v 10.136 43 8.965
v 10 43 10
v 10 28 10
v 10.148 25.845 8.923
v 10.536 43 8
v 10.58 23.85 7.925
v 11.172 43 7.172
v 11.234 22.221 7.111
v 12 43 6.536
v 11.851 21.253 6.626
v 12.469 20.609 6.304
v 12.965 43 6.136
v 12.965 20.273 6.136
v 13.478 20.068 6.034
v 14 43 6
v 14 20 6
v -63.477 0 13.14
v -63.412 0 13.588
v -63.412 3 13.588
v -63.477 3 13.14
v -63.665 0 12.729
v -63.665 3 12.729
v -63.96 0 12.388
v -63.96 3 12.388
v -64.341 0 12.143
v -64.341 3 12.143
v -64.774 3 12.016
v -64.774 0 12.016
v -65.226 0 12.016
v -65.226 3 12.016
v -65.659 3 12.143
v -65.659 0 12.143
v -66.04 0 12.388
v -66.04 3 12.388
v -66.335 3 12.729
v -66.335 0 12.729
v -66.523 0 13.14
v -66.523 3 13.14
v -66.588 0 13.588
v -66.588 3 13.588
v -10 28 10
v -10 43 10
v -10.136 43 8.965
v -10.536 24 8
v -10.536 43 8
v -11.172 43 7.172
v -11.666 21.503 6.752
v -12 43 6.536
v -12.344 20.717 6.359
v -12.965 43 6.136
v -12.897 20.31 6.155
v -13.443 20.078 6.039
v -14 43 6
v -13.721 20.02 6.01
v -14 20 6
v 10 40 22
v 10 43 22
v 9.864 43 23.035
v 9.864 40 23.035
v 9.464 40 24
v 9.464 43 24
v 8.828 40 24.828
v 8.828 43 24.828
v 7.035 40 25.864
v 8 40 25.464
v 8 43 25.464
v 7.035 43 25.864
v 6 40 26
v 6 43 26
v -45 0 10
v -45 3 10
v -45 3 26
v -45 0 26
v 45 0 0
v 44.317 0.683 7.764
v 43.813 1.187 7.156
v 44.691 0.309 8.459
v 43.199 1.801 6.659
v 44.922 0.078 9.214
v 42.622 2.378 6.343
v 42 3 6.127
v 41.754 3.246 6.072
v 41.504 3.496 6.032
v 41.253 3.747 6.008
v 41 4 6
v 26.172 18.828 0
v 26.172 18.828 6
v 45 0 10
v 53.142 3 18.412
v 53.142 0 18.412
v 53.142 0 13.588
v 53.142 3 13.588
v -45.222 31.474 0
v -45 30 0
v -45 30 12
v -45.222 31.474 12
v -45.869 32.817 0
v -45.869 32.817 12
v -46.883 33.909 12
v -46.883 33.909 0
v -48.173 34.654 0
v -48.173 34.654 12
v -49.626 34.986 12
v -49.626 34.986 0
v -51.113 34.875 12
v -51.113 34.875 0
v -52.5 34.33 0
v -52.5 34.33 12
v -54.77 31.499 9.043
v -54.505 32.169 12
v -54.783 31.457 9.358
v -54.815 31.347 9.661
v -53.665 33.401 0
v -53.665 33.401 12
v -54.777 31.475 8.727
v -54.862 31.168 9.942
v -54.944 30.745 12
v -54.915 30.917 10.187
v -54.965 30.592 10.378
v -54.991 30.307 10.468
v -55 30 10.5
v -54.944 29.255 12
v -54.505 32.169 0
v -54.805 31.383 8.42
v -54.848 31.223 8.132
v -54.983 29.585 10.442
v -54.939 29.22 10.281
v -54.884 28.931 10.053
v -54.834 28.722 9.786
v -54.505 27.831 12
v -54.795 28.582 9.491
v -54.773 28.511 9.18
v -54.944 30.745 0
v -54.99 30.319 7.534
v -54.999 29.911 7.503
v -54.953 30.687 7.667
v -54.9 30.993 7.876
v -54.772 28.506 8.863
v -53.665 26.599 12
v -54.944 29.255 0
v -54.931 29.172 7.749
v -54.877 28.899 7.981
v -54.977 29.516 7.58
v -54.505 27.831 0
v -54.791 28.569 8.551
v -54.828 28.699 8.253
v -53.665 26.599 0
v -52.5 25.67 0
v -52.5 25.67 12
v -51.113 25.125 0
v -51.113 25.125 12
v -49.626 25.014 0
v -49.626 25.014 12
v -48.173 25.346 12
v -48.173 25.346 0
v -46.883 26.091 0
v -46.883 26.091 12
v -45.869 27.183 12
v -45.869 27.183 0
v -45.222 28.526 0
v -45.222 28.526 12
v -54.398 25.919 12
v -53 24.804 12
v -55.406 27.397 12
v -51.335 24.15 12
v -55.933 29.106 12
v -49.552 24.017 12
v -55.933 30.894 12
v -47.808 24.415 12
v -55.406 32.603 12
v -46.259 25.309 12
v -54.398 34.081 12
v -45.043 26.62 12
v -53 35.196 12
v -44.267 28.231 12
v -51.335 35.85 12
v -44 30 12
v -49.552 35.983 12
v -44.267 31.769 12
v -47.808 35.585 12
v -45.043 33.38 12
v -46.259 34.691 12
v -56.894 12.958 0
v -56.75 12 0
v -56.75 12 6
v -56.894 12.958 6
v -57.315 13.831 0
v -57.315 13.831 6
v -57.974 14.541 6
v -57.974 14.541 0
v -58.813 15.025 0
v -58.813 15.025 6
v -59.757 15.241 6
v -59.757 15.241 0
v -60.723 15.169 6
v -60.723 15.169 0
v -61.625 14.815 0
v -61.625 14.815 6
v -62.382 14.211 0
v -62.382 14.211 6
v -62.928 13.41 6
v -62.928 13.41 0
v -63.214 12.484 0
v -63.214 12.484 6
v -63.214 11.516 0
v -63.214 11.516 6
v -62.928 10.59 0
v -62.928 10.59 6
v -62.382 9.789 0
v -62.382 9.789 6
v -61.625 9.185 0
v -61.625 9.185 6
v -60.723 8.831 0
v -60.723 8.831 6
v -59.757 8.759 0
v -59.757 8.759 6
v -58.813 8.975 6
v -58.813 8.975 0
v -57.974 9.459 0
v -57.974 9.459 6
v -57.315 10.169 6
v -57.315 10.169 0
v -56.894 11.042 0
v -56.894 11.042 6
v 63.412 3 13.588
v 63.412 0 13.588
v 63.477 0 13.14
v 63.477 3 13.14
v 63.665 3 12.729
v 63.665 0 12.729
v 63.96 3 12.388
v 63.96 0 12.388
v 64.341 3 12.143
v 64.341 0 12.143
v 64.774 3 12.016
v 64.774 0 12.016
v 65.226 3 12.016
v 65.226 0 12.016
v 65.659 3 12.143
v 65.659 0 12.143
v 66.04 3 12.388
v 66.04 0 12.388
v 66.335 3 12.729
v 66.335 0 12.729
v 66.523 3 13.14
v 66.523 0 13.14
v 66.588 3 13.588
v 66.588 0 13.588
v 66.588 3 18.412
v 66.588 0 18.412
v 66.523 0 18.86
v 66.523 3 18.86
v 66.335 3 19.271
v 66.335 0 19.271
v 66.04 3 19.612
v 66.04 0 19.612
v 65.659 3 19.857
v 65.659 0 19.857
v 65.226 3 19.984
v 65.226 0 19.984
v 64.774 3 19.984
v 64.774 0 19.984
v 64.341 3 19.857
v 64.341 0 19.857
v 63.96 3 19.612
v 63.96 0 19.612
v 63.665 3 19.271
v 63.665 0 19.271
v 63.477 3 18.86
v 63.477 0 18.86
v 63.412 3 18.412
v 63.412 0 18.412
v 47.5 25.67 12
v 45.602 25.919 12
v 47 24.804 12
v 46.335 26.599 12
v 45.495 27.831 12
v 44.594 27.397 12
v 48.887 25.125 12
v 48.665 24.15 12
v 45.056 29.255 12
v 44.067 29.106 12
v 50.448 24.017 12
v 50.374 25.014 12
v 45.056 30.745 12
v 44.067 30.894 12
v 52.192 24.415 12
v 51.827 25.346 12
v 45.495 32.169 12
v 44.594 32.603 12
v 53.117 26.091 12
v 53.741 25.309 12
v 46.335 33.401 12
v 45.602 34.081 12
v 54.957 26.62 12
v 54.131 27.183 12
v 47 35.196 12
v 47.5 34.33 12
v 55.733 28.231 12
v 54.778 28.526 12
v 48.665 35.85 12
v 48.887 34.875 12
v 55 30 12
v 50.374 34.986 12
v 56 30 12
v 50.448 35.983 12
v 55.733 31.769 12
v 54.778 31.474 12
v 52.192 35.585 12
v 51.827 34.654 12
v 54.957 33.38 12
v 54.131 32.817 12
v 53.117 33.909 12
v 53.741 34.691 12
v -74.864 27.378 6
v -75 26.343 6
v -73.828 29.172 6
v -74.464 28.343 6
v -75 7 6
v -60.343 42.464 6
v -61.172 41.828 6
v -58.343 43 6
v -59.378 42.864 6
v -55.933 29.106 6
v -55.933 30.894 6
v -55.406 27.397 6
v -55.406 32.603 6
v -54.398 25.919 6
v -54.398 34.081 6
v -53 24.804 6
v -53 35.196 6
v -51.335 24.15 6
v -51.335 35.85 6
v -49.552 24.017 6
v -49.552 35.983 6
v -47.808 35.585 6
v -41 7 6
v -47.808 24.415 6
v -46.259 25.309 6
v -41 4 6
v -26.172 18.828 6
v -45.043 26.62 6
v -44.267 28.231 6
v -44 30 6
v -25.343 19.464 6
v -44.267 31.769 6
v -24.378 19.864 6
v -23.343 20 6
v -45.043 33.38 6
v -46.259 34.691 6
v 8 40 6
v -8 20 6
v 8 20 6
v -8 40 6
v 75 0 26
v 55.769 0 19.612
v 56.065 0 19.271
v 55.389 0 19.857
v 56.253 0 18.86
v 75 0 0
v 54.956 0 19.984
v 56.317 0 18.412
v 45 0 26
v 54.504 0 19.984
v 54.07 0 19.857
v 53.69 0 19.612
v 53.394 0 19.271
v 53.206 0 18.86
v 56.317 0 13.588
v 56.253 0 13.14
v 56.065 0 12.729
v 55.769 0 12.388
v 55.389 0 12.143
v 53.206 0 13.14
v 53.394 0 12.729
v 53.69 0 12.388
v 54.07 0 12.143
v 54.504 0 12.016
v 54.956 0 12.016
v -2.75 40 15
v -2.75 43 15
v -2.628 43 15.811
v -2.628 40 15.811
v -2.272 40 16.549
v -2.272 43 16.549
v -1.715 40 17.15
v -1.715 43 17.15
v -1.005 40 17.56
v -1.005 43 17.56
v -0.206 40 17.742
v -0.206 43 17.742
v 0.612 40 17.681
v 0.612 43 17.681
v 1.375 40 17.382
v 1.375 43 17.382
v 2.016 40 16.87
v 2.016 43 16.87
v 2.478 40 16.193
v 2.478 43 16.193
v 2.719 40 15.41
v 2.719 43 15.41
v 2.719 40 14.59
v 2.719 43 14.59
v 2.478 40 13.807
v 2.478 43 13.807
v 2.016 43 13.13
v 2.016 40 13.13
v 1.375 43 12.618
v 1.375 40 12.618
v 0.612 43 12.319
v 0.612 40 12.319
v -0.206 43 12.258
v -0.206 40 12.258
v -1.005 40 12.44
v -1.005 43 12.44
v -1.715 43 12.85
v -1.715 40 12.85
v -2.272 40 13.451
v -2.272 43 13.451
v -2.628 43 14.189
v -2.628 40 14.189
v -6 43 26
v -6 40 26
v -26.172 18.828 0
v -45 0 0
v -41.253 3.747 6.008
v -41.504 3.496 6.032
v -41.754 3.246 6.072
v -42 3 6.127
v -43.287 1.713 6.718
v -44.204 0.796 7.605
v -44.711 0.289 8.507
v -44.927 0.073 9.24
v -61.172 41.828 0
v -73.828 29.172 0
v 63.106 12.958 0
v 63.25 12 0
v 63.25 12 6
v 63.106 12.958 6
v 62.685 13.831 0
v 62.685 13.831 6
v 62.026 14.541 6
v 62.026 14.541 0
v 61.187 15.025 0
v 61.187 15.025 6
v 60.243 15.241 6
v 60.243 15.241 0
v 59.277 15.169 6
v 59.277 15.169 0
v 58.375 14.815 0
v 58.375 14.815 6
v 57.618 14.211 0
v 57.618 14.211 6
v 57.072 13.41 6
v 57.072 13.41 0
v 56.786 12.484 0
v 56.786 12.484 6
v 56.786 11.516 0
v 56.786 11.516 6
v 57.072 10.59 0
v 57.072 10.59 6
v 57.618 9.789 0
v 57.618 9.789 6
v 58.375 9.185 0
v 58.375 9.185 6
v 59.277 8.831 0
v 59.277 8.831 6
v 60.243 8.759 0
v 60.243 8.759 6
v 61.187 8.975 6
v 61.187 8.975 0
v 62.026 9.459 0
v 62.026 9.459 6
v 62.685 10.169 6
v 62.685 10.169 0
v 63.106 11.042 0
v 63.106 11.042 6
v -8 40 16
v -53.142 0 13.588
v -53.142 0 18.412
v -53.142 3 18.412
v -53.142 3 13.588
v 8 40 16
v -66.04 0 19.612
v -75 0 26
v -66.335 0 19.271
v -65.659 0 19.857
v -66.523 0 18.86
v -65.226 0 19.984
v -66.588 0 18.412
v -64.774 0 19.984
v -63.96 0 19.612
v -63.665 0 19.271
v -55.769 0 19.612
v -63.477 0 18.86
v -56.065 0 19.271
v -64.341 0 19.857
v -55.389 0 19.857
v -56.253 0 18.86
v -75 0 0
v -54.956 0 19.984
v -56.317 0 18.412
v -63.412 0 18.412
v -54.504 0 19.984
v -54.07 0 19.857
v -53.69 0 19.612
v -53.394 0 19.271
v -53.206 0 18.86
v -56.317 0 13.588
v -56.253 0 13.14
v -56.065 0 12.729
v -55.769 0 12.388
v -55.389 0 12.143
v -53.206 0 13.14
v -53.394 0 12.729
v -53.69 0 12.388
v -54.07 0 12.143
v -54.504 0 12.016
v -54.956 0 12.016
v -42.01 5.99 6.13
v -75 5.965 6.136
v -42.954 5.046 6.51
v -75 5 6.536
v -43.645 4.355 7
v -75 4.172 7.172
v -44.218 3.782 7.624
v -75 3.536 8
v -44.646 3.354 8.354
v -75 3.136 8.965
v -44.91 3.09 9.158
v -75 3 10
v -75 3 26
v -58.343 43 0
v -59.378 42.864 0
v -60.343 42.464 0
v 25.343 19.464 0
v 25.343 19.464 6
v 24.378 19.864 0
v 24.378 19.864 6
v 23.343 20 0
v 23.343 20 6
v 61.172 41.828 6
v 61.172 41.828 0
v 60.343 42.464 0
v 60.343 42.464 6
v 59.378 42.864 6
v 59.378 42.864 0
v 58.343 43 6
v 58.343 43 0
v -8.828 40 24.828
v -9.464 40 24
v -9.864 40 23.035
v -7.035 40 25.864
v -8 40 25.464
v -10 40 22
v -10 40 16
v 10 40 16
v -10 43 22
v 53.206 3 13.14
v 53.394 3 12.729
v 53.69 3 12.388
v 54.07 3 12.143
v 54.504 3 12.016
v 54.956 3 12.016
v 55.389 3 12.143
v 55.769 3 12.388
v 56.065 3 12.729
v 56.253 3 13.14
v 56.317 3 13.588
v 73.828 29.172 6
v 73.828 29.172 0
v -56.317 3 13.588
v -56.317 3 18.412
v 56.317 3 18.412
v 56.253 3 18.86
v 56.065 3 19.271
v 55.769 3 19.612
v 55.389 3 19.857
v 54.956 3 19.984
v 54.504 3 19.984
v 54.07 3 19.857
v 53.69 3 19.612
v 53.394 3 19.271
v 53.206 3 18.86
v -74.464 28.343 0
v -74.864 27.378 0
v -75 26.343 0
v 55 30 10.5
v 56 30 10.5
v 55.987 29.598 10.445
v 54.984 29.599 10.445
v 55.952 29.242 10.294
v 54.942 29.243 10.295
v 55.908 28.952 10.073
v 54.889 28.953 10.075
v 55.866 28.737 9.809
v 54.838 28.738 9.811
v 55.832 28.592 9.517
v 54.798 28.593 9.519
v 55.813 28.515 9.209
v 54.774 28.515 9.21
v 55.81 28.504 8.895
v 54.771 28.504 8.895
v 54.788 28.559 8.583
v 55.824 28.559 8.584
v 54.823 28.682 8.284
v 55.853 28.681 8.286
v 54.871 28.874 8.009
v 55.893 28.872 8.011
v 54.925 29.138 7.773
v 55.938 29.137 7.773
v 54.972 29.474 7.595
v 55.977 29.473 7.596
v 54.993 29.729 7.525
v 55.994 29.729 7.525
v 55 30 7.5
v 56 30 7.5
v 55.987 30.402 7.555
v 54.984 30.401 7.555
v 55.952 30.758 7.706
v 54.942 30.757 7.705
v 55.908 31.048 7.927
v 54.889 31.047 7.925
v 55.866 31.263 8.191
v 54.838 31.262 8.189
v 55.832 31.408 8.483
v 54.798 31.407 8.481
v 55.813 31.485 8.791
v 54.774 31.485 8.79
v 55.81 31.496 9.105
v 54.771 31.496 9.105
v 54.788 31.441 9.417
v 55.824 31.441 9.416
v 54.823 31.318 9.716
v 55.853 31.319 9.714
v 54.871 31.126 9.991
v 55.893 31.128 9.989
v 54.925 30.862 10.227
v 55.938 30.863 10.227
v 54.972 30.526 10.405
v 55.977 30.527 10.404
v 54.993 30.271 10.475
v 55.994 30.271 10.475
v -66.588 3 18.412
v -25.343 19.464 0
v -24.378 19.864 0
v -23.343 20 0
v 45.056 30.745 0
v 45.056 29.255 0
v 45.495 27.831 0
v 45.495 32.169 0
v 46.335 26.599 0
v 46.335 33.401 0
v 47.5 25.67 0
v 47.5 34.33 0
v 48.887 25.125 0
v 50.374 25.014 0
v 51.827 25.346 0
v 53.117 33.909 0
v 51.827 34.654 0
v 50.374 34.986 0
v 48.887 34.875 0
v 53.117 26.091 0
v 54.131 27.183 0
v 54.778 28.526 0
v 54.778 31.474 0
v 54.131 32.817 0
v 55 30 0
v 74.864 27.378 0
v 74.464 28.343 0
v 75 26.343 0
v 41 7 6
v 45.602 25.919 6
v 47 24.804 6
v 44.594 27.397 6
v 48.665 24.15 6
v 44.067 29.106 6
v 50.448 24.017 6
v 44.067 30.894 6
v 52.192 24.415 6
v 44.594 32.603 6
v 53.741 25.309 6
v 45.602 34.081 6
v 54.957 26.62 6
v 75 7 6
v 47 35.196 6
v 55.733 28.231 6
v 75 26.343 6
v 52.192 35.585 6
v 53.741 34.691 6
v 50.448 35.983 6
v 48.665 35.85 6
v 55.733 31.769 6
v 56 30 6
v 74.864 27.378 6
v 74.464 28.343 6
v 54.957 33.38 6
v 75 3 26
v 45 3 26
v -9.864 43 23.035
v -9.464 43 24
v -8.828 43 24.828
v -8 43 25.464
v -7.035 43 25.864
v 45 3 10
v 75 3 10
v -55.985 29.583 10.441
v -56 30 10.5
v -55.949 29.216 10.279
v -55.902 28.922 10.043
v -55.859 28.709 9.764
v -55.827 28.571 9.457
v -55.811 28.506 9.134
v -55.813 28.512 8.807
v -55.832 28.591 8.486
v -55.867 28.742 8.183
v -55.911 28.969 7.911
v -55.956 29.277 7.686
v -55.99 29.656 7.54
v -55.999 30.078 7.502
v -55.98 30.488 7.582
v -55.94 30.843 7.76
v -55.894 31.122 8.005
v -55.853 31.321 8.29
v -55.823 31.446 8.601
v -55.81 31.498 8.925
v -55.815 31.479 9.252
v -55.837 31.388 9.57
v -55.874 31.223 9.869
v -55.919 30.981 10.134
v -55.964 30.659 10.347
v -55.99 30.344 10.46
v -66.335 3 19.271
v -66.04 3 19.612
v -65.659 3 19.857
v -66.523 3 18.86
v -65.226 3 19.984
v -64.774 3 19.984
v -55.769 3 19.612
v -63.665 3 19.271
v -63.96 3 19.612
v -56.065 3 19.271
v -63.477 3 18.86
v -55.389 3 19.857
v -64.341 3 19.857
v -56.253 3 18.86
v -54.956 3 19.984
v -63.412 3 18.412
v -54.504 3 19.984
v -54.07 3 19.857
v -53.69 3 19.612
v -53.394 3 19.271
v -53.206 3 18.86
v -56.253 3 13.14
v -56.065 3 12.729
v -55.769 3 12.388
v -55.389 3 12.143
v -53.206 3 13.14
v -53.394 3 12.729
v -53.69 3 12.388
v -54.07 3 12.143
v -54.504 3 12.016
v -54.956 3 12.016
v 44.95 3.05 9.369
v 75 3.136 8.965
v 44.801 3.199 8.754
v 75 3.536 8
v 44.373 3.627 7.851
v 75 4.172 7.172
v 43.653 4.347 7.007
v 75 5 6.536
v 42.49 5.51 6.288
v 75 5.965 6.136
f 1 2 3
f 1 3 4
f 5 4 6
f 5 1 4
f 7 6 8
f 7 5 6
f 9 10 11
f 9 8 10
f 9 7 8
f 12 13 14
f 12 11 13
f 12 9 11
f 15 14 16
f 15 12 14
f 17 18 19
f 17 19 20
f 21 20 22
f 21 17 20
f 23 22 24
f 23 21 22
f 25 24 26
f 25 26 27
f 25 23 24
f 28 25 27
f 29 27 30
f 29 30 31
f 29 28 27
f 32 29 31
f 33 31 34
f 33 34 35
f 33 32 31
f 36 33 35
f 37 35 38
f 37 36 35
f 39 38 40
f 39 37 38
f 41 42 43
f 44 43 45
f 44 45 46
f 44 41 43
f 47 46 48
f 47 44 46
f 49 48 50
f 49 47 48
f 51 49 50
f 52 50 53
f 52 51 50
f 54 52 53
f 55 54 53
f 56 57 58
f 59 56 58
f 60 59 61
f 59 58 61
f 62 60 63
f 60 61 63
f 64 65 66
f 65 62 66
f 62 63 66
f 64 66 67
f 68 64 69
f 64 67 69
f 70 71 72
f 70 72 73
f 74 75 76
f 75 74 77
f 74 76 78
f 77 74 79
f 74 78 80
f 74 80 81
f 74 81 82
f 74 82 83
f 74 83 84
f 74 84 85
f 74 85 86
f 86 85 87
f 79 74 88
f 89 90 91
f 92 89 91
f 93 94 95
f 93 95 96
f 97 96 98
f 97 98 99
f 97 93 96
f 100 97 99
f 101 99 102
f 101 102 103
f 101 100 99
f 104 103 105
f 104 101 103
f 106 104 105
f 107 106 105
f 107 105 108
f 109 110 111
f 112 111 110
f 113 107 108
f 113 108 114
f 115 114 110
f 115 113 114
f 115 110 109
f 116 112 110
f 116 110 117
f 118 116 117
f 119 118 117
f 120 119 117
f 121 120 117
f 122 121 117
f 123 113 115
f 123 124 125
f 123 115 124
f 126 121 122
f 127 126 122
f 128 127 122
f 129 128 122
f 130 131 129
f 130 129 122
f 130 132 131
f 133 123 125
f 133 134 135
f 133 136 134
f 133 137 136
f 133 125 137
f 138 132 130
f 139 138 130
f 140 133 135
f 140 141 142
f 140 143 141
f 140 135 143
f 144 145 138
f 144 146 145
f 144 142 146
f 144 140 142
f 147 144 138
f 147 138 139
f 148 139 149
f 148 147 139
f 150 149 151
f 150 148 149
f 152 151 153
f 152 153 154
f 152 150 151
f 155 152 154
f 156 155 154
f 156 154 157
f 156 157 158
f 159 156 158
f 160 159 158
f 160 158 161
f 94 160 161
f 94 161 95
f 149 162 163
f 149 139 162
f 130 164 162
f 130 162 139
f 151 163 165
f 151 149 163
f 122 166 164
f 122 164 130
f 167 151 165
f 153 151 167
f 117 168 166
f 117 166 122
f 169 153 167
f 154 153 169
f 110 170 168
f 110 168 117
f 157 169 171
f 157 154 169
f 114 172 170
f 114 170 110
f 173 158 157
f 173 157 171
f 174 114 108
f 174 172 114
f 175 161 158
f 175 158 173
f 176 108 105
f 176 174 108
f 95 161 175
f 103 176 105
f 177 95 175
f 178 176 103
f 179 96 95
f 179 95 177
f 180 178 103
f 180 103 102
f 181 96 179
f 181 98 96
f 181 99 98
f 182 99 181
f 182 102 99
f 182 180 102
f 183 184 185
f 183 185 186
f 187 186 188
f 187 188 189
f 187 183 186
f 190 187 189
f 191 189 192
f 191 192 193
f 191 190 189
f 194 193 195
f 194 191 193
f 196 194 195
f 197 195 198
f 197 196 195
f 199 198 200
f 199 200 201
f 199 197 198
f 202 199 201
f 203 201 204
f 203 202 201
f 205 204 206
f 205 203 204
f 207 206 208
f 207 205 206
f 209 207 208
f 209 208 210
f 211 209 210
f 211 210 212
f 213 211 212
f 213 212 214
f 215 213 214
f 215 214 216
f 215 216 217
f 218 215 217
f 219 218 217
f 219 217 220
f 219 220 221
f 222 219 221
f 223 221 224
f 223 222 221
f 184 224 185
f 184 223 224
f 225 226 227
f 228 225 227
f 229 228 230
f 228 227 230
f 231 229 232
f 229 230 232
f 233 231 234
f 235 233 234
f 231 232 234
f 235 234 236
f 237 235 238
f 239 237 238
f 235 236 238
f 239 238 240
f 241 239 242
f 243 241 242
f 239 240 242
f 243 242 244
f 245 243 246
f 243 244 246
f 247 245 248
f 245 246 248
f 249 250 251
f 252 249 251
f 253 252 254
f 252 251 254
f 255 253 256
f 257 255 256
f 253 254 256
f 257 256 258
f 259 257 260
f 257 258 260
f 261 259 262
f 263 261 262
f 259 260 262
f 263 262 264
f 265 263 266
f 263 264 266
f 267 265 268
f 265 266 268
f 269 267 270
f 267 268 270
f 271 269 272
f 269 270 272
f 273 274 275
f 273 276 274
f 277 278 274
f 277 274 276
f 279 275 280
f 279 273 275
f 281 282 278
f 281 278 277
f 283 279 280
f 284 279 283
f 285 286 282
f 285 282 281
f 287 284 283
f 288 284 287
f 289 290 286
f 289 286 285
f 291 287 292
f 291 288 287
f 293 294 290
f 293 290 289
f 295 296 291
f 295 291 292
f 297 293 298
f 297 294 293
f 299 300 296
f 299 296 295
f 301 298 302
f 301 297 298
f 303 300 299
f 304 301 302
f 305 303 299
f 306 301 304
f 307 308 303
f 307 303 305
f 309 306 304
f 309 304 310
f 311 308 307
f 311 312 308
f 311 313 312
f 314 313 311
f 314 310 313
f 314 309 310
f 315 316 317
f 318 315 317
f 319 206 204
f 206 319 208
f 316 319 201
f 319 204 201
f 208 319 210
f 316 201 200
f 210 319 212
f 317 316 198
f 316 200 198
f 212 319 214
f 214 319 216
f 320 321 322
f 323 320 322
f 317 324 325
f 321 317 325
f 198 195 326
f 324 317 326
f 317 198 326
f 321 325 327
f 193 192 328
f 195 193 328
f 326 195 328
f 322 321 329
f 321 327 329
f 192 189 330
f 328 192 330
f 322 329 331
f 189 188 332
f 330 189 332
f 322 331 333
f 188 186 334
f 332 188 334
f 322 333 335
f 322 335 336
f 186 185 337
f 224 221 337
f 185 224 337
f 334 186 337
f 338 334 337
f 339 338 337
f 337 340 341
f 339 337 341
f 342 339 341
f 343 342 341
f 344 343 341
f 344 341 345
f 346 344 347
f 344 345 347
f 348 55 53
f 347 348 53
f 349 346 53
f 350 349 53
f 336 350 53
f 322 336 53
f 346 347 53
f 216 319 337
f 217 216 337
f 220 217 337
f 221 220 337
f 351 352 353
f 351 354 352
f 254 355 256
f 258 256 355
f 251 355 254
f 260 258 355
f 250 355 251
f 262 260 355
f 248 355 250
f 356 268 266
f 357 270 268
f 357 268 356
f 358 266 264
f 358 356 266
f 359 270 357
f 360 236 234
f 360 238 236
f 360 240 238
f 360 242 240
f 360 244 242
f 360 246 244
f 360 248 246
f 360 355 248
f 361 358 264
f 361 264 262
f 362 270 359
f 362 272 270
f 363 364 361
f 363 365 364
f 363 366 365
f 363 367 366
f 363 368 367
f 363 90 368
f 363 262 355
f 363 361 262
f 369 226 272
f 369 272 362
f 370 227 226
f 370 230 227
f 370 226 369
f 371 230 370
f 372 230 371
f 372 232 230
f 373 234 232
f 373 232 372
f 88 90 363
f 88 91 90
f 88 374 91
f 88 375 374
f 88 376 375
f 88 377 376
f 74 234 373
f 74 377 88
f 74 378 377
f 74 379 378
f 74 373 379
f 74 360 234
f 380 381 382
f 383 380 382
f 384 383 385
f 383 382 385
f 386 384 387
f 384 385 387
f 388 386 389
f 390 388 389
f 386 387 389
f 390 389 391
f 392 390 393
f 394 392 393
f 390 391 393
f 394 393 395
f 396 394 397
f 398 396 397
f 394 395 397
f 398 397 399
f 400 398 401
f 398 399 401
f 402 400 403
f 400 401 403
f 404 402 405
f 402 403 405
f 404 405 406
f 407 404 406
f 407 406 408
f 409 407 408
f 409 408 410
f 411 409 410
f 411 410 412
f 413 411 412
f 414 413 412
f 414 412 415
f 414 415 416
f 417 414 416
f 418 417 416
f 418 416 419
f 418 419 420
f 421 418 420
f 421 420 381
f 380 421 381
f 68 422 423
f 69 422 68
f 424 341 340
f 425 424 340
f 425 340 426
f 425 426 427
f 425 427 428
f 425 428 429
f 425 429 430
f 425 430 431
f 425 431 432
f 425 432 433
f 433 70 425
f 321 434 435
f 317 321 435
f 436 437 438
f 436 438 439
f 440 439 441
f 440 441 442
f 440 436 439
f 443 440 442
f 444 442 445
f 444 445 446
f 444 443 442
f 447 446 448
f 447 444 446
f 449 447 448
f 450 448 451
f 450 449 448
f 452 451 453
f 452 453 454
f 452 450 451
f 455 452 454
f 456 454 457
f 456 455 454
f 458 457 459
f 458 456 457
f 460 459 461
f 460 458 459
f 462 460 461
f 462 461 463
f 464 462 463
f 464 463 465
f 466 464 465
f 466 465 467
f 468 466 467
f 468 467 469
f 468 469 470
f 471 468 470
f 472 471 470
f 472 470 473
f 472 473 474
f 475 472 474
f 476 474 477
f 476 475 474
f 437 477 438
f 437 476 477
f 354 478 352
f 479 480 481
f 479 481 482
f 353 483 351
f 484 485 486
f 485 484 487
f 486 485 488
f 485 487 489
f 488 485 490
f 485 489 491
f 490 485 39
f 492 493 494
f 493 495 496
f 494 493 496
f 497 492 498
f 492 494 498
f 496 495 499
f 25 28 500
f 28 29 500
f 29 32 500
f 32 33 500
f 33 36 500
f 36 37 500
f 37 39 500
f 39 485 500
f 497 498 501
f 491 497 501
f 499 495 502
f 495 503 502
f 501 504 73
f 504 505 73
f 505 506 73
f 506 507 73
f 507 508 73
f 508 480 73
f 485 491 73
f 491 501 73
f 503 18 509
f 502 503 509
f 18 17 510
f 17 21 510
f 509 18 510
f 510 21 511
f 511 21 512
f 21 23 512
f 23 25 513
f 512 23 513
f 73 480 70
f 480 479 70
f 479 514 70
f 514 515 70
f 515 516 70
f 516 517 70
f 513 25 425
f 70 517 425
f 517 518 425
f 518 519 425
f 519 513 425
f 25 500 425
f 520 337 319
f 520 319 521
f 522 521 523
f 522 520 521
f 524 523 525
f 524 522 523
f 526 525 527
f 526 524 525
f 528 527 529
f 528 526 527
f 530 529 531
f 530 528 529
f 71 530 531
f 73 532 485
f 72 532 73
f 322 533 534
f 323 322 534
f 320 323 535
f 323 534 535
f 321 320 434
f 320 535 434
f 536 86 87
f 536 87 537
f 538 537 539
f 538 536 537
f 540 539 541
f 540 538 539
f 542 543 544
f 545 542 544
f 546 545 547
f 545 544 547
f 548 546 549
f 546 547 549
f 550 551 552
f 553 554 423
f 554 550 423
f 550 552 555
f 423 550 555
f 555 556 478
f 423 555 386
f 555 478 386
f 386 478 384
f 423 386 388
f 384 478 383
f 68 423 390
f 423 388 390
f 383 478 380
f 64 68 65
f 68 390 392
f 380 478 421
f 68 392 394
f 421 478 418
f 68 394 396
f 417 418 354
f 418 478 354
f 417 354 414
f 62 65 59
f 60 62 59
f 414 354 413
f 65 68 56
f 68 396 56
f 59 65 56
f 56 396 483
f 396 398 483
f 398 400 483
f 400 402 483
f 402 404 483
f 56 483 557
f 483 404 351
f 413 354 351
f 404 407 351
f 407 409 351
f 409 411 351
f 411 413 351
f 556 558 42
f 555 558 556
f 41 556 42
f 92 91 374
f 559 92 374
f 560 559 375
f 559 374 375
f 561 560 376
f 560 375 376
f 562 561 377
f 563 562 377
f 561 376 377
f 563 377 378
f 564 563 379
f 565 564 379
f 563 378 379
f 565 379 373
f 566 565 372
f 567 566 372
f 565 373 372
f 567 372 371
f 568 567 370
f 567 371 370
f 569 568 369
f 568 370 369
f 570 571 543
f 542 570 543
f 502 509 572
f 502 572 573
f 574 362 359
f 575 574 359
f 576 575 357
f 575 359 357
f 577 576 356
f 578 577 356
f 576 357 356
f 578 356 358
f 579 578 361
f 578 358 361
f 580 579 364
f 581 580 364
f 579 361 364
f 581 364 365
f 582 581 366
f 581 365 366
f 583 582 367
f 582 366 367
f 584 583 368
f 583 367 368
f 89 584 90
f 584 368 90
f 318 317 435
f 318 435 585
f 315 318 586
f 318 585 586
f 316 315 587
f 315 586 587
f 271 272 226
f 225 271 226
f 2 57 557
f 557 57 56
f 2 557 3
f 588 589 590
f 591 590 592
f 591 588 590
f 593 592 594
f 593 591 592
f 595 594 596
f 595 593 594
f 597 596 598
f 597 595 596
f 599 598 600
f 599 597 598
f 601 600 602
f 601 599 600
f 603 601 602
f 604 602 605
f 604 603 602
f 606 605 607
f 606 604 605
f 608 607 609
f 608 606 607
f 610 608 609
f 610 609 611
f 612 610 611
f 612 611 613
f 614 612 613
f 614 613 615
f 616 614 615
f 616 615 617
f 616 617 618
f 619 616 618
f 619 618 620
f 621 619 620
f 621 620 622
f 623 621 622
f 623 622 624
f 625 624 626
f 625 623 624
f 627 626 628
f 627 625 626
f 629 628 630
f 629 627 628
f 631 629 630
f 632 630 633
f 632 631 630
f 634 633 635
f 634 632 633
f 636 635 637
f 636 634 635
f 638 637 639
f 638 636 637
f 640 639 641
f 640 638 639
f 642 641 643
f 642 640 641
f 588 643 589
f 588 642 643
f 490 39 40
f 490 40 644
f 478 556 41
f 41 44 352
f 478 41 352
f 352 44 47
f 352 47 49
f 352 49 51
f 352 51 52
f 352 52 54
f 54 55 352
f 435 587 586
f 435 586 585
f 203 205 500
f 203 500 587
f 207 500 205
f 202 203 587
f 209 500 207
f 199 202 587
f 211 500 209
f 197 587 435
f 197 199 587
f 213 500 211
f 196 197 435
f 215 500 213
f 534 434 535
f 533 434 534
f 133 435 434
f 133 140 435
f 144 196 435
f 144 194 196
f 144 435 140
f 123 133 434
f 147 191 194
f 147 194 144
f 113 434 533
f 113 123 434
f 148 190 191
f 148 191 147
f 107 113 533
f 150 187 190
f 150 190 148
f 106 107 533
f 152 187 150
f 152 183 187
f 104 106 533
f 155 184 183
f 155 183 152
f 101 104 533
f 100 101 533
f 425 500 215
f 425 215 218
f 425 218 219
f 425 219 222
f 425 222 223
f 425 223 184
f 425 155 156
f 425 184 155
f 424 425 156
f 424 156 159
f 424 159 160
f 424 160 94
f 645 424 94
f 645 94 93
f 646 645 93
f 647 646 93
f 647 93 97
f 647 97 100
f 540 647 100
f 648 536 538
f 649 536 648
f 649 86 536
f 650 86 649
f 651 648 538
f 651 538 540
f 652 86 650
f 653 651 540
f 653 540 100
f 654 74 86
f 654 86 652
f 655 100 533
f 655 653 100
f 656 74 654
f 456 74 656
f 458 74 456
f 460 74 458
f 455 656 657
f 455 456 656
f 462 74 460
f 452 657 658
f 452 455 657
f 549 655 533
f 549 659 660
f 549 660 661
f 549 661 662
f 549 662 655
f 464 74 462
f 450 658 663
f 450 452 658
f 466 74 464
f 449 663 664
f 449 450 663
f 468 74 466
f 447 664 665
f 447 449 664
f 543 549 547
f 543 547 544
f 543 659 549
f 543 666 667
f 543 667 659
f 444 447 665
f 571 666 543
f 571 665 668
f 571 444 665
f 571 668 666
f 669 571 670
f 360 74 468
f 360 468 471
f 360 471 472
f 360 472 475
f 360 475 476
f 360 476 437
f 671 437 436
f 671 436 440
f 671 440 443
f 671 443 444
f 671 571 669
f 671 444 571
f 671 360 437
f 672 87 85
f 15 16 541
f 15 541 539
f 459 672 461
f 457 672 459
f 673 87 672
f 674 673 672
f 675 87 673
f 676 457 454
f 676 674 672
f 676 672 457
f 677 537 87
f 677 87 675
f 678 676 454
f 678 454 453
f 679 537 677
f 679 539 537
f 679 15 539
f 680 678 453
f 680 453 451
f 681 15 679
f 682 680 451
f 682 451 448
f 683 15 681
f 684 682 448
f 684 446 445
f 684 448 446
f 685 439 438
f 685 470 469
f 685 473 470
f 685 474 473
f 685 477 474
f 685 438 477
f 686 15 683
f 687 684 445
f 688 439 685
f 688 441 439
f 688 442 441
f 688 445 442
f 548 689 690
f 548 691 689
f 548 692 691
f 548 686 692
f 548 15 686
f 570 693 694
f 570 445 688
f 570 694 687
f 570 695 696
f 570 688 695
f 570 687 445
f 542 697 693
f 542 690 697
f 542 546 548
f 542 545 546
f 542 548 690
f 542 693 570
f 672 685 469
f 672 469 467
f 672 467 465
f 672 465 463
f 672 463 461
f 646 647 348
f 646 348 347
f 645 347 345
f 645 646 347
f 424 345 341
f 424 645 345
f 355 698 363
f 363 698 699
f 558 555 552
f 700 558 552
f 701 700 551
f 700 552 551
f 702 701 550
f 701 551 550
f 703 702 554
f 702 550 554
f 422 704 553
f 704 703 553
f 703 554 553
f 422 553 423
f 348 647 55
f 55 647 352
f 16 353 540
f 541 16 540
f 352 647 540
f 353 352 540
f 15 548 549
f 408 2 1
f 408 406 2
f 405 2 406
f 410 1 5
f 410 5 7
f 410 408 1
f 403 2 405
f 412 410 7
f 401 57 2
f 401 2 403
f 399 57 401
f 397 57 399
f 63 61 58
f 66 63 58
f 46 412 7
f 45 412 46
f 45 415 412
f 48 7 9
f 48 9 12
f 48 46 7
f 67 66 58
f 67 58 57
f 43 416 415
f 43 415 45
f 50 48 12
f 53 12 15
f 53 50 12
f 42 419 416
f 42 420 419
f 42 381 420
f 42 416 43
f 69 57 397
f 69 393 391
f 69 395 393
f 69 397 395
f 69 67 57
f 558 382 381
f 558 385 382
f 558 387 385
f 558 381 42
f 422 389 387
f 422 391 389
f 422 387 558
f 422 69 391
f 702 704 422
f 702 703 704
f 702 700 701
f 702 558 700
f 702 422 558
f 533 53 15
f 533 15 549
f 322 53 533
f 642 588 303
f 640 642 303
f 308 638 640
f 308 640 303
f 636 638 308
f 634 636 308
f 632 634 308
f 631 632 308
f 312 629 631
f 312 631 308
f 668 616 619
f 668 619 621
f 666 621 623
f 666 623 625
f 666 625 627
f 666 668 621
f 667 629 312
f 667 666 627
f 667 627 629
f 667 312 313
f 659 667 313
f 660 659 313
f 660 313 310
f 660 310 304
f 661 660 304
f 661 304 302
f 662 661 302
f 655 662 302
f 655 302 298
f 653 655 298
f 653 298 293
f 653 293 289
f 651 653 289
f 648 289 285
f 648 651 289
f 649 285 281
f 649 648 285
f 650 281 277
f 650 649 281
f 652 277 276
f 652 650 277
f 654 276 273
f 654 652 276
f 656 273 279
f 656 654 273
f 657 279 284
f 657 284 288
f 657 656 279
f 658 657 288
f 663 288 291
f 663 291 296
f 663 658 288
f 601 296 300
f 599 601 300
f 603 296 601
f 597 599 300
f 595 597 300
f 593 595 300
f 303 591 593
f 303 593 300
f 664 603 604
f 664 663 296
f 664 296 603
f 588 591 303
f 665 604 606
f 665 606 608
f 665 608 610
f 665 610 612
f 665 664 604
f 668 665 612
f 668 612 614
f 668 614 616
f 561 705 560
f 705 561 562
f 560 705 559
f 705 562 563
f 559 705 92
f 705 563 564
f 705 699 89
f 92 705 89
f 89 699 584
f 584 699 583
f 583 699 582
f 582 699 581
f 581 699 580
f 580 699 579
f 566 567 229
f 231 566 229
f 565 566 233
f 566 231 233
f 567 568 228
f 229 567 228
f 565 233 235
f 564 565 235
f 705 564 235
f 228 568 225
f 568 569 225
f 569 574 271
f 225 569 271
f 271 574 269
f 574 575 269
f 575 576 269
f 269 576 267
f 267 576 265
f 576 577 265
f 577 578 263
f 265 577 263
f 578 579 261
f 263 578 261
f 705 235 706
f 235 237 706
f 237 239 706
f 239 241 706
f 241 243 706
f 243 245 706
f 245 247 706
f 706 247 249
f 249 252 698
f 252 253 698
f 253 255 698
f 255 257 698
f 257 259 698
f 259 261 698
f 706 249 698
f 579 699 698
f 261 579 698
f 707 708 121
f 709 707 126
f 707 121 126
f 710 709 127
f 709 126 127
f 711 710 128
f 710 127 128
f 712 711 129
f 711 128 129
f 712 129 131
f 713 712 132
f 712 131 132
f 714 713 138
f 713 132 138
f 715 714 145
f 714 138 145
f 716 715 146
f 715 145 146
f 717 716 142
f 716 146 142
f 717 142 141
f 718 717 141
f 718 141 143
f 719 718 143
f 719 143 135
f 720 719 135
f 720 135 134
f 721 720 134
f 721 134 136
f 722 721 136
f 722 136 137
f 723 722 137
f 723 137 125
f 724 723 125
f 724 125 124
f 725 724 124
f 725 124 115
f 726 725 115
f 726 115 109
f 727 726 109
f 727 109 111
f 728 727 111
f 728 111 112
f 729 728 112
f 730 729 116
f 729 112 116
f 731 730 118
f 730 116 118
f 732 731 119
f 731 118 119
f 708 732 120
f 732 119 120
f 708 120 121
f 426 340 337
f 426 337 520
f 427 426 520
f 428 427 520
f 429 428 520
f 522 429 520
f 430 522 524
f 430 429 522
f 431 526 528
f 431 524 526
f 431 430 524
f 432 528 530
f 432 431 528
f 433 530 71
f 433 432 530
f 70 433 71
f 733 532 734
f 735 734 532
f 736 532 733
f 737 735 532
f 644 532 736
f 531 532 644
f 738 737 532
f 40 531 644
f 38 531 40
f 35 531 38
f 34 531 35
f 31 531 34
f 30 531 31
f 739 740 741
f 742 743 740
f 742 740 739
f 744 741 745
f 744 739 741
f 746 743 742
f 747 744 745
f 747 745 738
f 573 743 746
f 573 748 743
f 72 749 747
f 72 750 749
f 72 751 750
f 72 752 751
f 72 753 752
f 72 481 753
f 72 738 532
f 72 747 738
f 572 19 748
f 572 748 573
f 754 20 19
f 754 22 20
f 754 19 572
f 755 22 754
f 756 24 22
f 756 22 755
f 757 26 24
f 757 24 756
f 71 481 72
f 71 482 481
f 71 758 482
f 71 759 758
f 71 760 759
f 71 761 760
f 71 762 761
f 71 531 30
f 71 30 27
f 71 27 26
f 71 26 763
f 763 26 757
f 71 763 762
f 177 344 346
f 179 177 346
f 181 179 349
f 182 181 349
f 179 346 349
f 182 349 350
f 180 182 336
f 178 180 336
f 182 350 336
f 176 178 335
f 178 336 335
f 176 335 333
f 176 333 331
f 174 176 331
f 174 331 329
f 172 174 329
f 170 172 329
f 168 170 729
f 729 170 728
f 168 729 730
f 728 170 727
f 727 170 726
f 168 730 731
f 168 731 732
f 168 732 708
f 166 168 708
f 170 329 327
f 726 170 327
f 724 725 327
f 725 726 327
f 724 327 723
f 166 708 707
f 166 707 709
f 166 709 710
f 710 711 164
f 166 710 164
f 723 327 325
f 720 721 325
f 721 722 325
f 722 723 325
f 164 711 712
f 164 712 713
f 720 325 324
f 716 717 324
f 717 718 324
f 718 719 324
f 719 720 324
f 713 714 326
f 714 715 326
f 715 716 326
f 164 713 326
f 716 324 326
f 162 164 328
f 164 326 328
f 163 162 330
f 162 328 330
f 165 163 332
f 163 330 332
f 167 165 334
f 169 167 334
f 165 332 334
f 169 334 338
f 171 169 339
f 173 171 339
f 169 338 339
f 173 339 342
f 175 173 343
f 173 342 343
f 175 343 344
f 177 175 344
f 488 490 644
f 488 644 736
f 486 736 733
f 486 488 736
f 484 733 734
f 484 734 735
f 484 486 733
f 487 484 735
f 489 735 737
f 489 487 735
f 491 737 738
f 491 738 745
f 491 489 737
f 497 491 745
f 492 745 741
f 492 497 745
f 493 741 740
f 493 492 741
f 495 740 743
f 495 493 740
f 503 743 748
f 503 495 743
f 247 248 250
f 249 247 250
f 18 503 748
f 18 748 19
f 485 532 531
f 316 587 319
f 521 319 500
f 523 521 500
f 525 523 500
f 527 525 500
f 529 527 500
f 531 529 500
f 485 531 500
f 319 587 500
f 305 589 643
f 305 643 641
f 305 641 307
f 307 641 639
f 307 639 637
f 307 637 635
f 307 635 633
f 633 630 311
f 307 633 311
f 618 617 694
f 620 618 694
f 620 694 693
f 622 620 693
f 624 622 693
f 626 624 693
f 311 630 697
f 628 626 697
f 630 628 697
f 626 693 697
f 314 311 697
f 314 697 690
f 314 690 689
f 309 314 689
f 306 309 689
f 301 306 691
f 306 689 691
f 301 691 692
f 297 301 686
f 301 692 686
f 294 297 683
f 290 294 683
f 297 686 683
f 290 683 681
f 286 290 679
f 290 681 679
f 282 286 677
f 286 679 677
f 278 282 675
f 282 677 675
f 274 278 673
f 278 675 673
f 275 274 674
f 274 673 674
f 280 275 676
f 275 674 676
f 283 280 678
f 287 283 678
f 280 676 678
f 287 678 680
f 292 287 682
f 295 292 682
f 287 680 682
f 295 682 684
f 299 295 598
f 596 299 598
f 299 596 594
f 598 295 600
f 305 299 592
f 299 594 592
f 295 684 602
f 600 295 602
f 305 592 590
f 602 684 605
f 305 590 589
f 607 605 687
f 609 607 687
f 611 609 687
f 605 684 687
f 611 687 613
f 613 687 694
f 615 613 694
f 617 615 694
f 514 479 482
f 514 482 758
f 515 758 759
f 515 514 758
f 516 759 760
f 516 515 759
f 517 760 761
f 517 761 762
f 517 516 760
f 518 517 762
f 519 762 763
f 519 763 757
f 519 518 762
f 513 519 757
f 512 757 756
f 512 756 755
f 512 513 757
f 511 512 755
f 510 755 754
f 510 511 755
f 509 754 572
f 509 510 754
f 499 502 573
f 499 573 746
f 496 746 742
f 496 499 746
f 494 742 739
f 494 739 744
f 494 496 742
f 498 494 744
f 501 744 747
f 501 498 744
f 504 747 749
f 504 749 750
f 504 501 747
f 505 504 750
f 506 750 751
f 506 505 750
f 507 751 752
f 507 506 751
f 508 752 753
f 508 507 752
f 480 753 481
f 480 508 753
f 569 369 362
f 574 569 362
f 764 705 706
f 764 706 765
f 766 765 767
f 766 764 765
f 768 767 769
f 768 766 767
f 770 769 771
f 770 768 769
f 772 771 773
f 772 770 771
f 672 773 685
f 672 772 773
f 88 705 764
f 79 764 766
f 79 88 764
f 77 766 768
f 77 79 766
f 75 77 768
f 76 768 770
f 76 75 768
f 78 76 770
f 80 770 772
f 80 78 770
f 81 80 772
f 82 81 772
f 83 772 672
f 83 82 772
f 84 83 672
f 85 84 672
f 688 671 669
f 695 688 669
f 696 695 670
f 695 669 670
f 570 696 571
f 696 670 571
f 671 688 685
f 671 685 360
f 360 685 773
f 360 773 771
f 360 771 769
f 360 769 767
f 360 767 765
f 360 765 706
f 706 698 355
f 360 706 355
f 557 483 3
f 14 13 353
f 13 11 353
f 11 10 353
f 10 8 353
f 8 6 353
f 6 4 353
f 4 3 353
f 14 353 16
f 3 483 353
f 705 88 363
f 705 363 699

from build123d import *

# Parameters (mm, degrees)
CROQUIS1_R                            = 3.25
CROQUIS1_R_2                          = 5
SALIENTE_EXTRUIR1_DEPTH               = 6
CROQUIS2_R                            = 6
CROQUIS2_R_2                          = 5
SALIENTE_EXTRUIR2_DEPTH               = 6
CROQUIS4_W                            = 20
CROQUIS4_H                            = 3
SALIENTE_EXTRUIR3_DEPTH               = 20
CROQUIS11_R                           = 2.75
CORTAR_EXTRUIR2_DEPTH                 = 10
NERVIO2_REACH                         = 100.742
CROQUIS7_WALL_W                       = 221.844856356
CROQUIS7_WALL_H                       = 2
CROQUIS8_W                            = 30
CROQUIS8_H                            = 3
SALIENTE_EXTRUIR4_DEPTH               = 20
DI_METRO_DE_TALADRO_1_8_0_125_2_DEPTH = 3
CROQUIS12_R                           = 1.5
CORTAR_EXTRUIR3_DEPTH                 = 10
REDONDEO1_R                           = 4


# Read off the part's stored shape, not the designer's step: Diámetro de taladro 1/8 (0.125)2
with BuildPart() as part:
    # Croquis1 → Saliente-Extruir1 (new body)
    with BuildSketch(Plane.XY):
        Polygon((60, 43), (-60, 43), (-75, 28), (-75, 0), (-45, 0), (-25, 20), (25, 20), (45, 0), (75, 0), (75, 28), align=None)
        with Locations((-60, 12)):
            Circle(CROQUIS1_R, mode=Mode.SUBTRACT)
        with Locations((60, 12)):
            Circle(CROQUIS1_R, mode=Mode.SUBTRACT)
        with Locations((-50, 30)):
            Circle(CROQUIS1_R_2, mode=Mode.SUBTRACT)
        with Locations((50, 30)):
            Circle(CROQUIS1_R_2, mode=Mode.SUBTRACT)
    extrude(amount=SALIENTE_EXTRUIR1_DEPTH)

    # Croquis2 → Saliente-Extruir2 (add)
    # profile 1 of 2: a face of its own
    with BuildSketch(Plane.XY.offset(6)):
        with Locations((-50, 30)):
            Circle(CROQUIS2_R)
        with Locations((-50, 30)):
            Circle(CROQUIS2_R_2, mode=Mode.SUBTRACT)
    # profile 2 of 2: a face of its own
    with BuildSketch(Plane.XY.offset(6)):
        with Locations((50, 30)):
            Circle(CROQUIS2_R)
        with Locations((50, 30)):
            Circle(CROQUIS2_R_2, mode=Mode.SUBTRACT)
    extrude(amount=SALIENTE_EXTRUIR2_DEPTH)

    # Croquis4 → Saliente-Extruir3 (add)
    with BuildSketch(Plane.XY.offset(6)):
        with Locations((0, 41.5)):
            Rectangle(CROQUIS4_W, CROQUIS4_H)
    extrude(amount=SALIENTE_EXTRUIR3_DEPTH)

    # Croquis11 → Cortar-Extruir2 (cut)
    with BuildSketch(Plane(origin=(0, 43, 0), x_dir=(1, 0, 0), z_dir=(0, 1, 0))):
        with Locations(Location((0, -15, 0), (0, 0, 180))):
            Circle(CROQUIS11_R)
    extrude(amount=-CORTAR_EXTRUIR2_DEPTH, mode=Mode.SUBTRACT)

    # Croquis7 wall → Nervio2 (add, up to next)
    with BuildSketch(Plane(origin=(-10, 30, 11), x_dir=(0, -0.894427191, -0.4472135955), z_dir=(0, -0.4472135955, 0.894427191)), mode=Mode.PRIVATE) as nervio2_sk1:
        with Locations((0, 1)):
            Rectangle(CROQUIS7_WALL_W, CROQUIS7_WALL_H)
    nervio2_tool1 = extrude(nervio2_sk1.sketch, amount=-NERVIO2_REACH, mode=Mode.PRIVATE) - part.part
    nervio2 = nervio2_tool1.solids().sort_by_distance((-10, 30, 11))[0]
    add(nervio2)

    # Croquis8 → Saliente-Extruir4 (add)
    with BuildSketch(Plane.XY.offset(6)):
        with Locations((-60, 1.5)):
            Rectangle(CROQUIS8_W, CROQUIS8_H)
    saliente_extruir4 = extrude(amount=SALIENTE_EXTRUIR4_DEPTH)

    # Diámetro de taladro 1/8 (0.125)2 outline → Diámetro de taladro 1/8 (0.125)2 (cut)
    with BuildSketch(Plane(origin=(0, 0, 0), x_dir=(1, 0, 0), z_dir=(0, 1, 0))):
        with BuildLine():
            Line((-53.142177149, -18.4125), (-53.142177149, -13.5875))
            ThreePointArc((-53.142177149, -13.5875), (-54.729677149, -12), (-56.317177149, -13.5875))
            Line((-56.317177149, -13.5875), (-56.317177149, -18.4125))
            ThreePointArc((-56.317177149, -18.4125), (-54.729677149, -20), (-53.142177149, -18.4125))
        make_face()
        with BuildLine():
            Line((-63.4125, -18.4125), (-63.4125, -13.5875))
            ThreePointArc((-63.4125, -13.5875), (-65, -12), (-66.5875, -13.5875))
            Line((-66.5875, -13.5875), (-66.5875, -18.4125))
            ThreePointArc((-66.5875, -18.4125), (-65, -20), (-63.4125, -18.4125))
        make_face()
    di_metro_de_taladro_1_8_0_125_2 = extrude(amount=DI_METRO_DE_TALADRO_1_8_0_125_2_DEPTH, mode=Mode.SUBTRACT)

    # Croquis12 → Cortar-Extruir3 (cut)
    with BuildSketch(Plane(origin=(-50, 0, 0), x_dir=(0, 0, -1), z_dir=(1, 0, 0))):
        with Locations(Location((-9, 30, 0), (0, 0, 180))):
            Circle(CROQUIS12_R)
    cortar_extruir3 = extrude(amount=-CORTAR_EXTRUIR3_DEPTH, mode=Mode.SUBTRACT)

    # Simetría2: Nervio2, Saliente-Extruir4, Diámetro de taladro 1/8 (0.125)2, Cortar-Extruir3 across plane
    add(nervio2.mirror(Plane(origin=(0, 0, 0), x_dir=(0, 0, 1), z_dir=(1, 0, 0))))
    add(saliente_extruir4.mirror(Plane(origin=(0, 0, 0), x_dir=(0, 0, 1), z_dir=(1, 0, 0))))
    add(di_metro_de_taladro_1_8_0_125_2.mirror(Plane(origin=(0, 0, 0), x_dir=(0, 0, 1), z_dir=(1, 0, 0))), mode=Mode.SUBTRACT)
    add(cortar_extruir3.mirror(Plane(origin=(0, 0, 0), x_dir=(0, 0, 1), z_dir=(1, 0, 0))), mode=Mode.SUBTRACT)

    # Redondeo1
    # the kernel refuses this fillet: 4 mm, written as the material it adds along each edge
    with BuildSketch(Plane(origin=(-45, 3, 6), x_dir=(0, 1, 0), z_dir=(-1, 0, 0))) as redondeo1_piece_1:
        with BuildLine():
            CenterArc((REDONDEO1_R, -REDONDEO1_R), REDONDEO1_R, 90, 90)
            Line((0, -REDONDEO1_R), (0, 0))
            Line((0, 0), (REDONDEO1_R, 0))
        make_face()
    extrude(amount=30)
    with BuildSketch(Plane(origin=(45, 0, 6), x_dir=(-1, 0, 0), z_dir=(0, 1, 0))) as redondeo1_piece_2_section:
        with BuildLine():
            CenterArc((REDONDEO1_R, REDONDEO1_R), REDONDEO1_R, 180, 90)
            Line((0, REDONDEO1_R), (0, 0))
            Line((0, 0), (REDONDEO1_R, 0))
        make_face()
    redondeo1_piece_2 = extrude(amount=3, mode=Mode.PRIVATE)
    redondeo1_piece_2 = split(redondeo1_piece_2, bisect_by=Plane(origin=(43.821771507, 1.178228493, 7.107331066), z_dir=(0.7071067811865477, 0.7071067811865474, 0)), keep=Keep.TOP, mode=Mode.PRIVATE)
    add(redondeo1_piece_2)
    with BuildSketch(Plane(origin=(45, 3, 6), x_dir=(0, 1, 0), z_dir=(1, 0, 0))) as redondeo1_piece_3:
        with BuildLine():
            CenterArc((REDONDEO1_R, REDONDEO1_R), REDONDEO1_R, 180, 90)
            Line((0, REDONDEO1_R), (0, 0))
            Line((0, 0), (REDONDEO1_R, 0))
        make_face()
    extrude(amount=30)
    with BuildSketch(Plane(origin=(-25, 20, 0), x_dir=(-0.7071067811865421, -0.7071067811865528, 0), z_dir=(0, 0, 1)), Plane(origin=(25, 20, 0), x_dir=(-1, 0, 0), z_dir=(0, 0, 1))) as redondeo1_piece_4:
        with BuildLine():
            CenterArc((REDONDEO1_R * 0.414213562373, REDONDEO1_R), REDONDEO1_R, 225, 45)
            Line((-REDONDEO1_R * 0.292893218813, REDONDEO1_R * 0.292893218813), (0, 0))
            Line((0, 0), (REDONDEO1_R * 0.414213562373, 0))
        make_face()
    extrude(amount=6)
    with BuildSketch(Plane(origin=(-10, 20, 6), x_dir=(-1, 0, 0), z_dir=(0, 1, 0))) as redondeo1_piece_5_section:
        with BuildLine():
            CenterArc((REDONDEO1_R, REDONDEO1_R), REDONDEO1_R, 180, 90)
            Line((0, REDONDEO1_R), (0, 0))
            Line((0, 0), (REDONDEO1_R, 0))
        make_face()
    redondeo1_piece_5 = extrude(amount=23, mode=Mode.PRIVATE)
    redondeo1_piece_5 = split(redondeo1_piece_5, bisect_by=Plane(origin=(-10.946740329, 30.205569968, 11.102784984), z_dir=(0, 0.447213595499958, -0.894427190999916)), keep=Keep.TOP, mode=Mode.PRIVATE)
    add(redondeo1_piece_5)
    with BuildSketch(Plane(origin=(10, 43, 6), x_dir=(1, 0, 0), z_dir=(0, -1, 0))) as redondeo1_piece_6_section:
        with BuildLine():
            CenterArc((REDONDEO1_R, REDONDEO1_R), REDONDEO1_R, 180, 90)
            Line((0, REDONDEO1_R), (0, 0))
            Line((0, 0), (REDONDEO1_R, 0))
        make_face()
    redondeo1_piece_6 = extrude(amount=23, mode=Mode.PRIVATE)
    redondeo1_piece_6 = split(redondeo1_piece_6, bisect_by=Plane(origin=(10.946740329, 30.205569968, 11.102784984), z_dir=(0, 0.447213595499958, -0.894427190999916)), keep=Keep.TOP, mode=Mode.PRIVATE)
    add(redondeo1_piece_6)
    with BuildSketch(Plane(origin=(-45, 0, 6), x_dir=(1, 0, 0), z_dir=(0, 1, 0))) as redondeo1_piece_7_section:
        with BuildLine():
            CenterArc((REDONDEO1_R, -REDONDEO1_R), REDONDEO1_R, 90, 90)
            Line((0, -REDONDEO1_R), (0, 0))
            Line((0, 0), (REDONDEO1_R, 0))
        make_face()
    redondeo1_piece_7 = extrude(amount=3, mode=Mode.PRIVATE)
    redondeo1_piece_7 = split(redondeo1_piece_7, bisect_by=Plane(origin=(-43.821771507, 1.178228493, 7.107331066), z_dir=(-0.7071067811865537, 0.7071067811865415, 0)), keep=Keep.TOP, mode=Mode.PRIVATE)
    add(redondeo1_piece_7)
    with BuildSketch(Plane(origin=(-45, 0, 6), x_dir=(1, 0, 0), z_dir=(0, 1, 0))) as redondeo1_piece_8a_section:
        with BuildLine():
            CenterArc((REDONDEO1_R, -REDONDEO1_R), REDONDEO1_R, 90, 90)
            Line((0, -REDONDEO1_R), (0, 0))
            Line((0, 0), (REDONDEO1_R, 0))
        make_face()
    redondeo1_piece_8a = extrude(amount=13, mode=Mode.PRIVATE)
    redondeo1_piece_8a = split(redondeo1_piece_8a, bisect_by=Plane(origin=(-40.545977817, 4.454022183, 6.906735099), z_dir=(-0.7071067811865537, 0.7071067811865415, 0)), keep=Keep.TOP, mode=Mode.PRIVATE)
    redondeo1_piece_8a = split(redondeo1_piece_8a, bisect_by=Plane(origin=(-44.097771326, 3, 6.906735099), z_dir=(0, 1, 0)), keep=Keep.TOP, mode=Mode.PRIVATE)
    with BuildSketch(Plane(origin=(-35, 3, 6), x_dir=(0, 1, 0), z_dir=(-1, 0, 0))) as redondeo1_piece_8b_section:
        with BuildLine():
            CenterArc((REDONDEO1_R, -REDONDEO1_R), REDONDEO1_R, 90, 90)
            Line((0, -REDONDEO1_R), (0, 0))
            Line((0, 0), (REDONDEO1_R, 0))
        make_face()
    redondeo1_piece_8b = extrude(amount=40, mode=Mode.PRIVATE)
    redondeo1_piece_8b = split(redondeo1_piece_8b, bisect_by=Plane(origin=(-41.928013954, 3.071986046, 6.793098492), z_dir=(-0.7071067811865537, 0.7071067811865415, 0)), keep=Keep.TOP, mode=Mode.PRIVATE)
    redondeo1_piece_8b = split(redondeo1_piece_8b, bisect_by=Plane(origin=(-45, 4.095981395, 6.793098492), z_dir=(1, 0, 0)), keep=Keep.TOP, mode=Mode.PRIVATE)
    redondeo1_piece_8 = redondeo1_piece_8a & redondeo1_piece_8b
    add(redondeo1_piece_8)
    with BuildSketch(Plane(origin=(35, 3, 6), x_dir=(0, 1, 0), z_dir=(1, 0, 0))) as redondeo1_piece_9a_section:
        with BuildLine():
            CenterArc((REDONDEO1_R, REDONDEO1_R), REDONDEO1_R, 180, 90)
            Line((0, REDONDEO1_R), (0, 0))
            Line((0, 0), (REDONDEO1_R, 0))
        make_face()
    redondeo1_piece_9a = extrude(amount=40, mode=Mode.PRIVATE)
    redondeo1_piece_9a = split(redondeo1_piece_9a, bisect_by=Plane(origin=(41.928013954, 3.071986046, 6.793098492), z_dir=(0.7071067811865477, 0.7071067811865474, 0)), keep=Keep.TOP, mode=Mode.PRIVATE)
    redondeo1_piece_9a = split(redondeo1_piece_9a, bisect_by=Plane(origin=(45, 4.095981395, 6.793098492), z_dir=(-1, 0, 0)), keep=Keep.TOP, mode=Mode.PRIVATE)
    with BuildSketch(Plane(origin=(45, 0, 6), x_dir=(-1, 0, 0), z_dir=(0, 1, 0))) as redondeo1_piece_9b_section:
        with BuildLine():
            CenterArc((REDONDEO1_R, REDONDEO1_R), REDONDEO1_R, 180, 90)
            Line((0, REDONDEO1_R), (0, 0))
            Line((0, 0), (REDONDEO1_R, 0))
        make_face()
    redondeo1_piece_9b = extrude(amount=13, mode=Mode.PRIVATE)
    redondeo1_piece_9b = split(redondeo1_piece_9b, bisect_by=Plane(origin=(40.545977817, 4.454022183, 6.906735099), z_dir=(0.7071067811865477, 0.7071067811865474, 0)), keep=Keep.TOP, mode=Mode.PRIVATE)
    redondeo1_piece_9b = split(redondeo1_piece_9b, bisect_by=Plane(origin=(44.097771326, 3, 6.906735099), z_dir=(0, 1, 0)), keep=Keep.TOP, mode=Mode.PRIVATE)
    redondeo1_piece_9 = redondeo1_piece_9a & redondeo1_piece_9b
    add(redondeo1_piece_9)
    # the kernel refuses this fillet: 4 mm, written as the material it takes off along each edge
    with BuildSketch(Plane(origin=(-75, 28, -4.142135624), x_dir=(0, -1, 0), z_dir=(0, 0, 1)), Plane(origin=(60, 43, -4.142135624), x_dir=(-1, 0, 0), z_dir=(0, 0, 1))) as redondeo1_2_piece_1:
        with BuildLine():
            CenterArc((REDONDEO1_R * 0.414213562373, REDONDEO1_R), REDONDEO1_R, 225, 45)
            Line((-REDONDEO1_R * 0.292893218813, REDONDEO1_R * 0.292893218813), (0, 0))
            Line((0, 0), (REDONDEO1_R * 0.414213562373, 0))
        make_face()
    extrude(amount=14.284271247, mode=Mode.SUBTRACT)
    with BuildSketch(Plane(origin=(-60, 43, -4.142135624), x_dir=(1, 0, 0), z_dir=(0, 0, 1)), Plane(origin=(75, 28, -4.142135624), x_dir=(0, -1, 0), z_dir=(0, 0, 1))) as redondeo1_2_piece_2:
        with BuildLine():
            CenterArc((REDONDEO1_R * 0.414213562373, -REDONDEO1_R), REDONDEO1_R, 90, 45)
            Line((-REDONDEO1_R * 0.292893218813, -REDONDEO1_R * 0.292893218813), (0, 0))
            Line((0, 0), (REDONDEO1_R * 0.414213562373, 0))
        make_face()
    extrude(amount=14.284271247, mode=Mode.SUBTRACT)
    with BuildSketch(Plane(origin=(-10, 30, 26), x_dir=(0, 0, -1), z_dir=(0, 1, 0))) as redondeo1_2_piece_3:
        with BuildLine():
            CenterArc((REDONDEO1_R, -REDONDEO1_R), REDONDEO1_R, 90, 90)
            Line((0, -REDONDEO1_R), (0, 0))
            Line((0, 0), (REDONDEO1_R, 0))
        make_face()
    extrude(amount=23, mode=Mode.SUBTRACT)
    with BuildSketch(Plane(origin=(10, 53, 26), x_dir=(-1, 0, 0), z_dir=(0, -1, 0))) as redondeo1_2_piece_4:
        with BuildLine():
            CenterArc((REDONDEO1_R, REDONDEO1_R), REDONDEO1_R, 180, 90)
            Line((0, REDONDEO1_R), (0, 0))
            Line((0, 0), (REDONDEO1_R, 0))
        make_face()
    extrude(amount=23, mode=Mode.SUBTRACT)


solid = part.part
